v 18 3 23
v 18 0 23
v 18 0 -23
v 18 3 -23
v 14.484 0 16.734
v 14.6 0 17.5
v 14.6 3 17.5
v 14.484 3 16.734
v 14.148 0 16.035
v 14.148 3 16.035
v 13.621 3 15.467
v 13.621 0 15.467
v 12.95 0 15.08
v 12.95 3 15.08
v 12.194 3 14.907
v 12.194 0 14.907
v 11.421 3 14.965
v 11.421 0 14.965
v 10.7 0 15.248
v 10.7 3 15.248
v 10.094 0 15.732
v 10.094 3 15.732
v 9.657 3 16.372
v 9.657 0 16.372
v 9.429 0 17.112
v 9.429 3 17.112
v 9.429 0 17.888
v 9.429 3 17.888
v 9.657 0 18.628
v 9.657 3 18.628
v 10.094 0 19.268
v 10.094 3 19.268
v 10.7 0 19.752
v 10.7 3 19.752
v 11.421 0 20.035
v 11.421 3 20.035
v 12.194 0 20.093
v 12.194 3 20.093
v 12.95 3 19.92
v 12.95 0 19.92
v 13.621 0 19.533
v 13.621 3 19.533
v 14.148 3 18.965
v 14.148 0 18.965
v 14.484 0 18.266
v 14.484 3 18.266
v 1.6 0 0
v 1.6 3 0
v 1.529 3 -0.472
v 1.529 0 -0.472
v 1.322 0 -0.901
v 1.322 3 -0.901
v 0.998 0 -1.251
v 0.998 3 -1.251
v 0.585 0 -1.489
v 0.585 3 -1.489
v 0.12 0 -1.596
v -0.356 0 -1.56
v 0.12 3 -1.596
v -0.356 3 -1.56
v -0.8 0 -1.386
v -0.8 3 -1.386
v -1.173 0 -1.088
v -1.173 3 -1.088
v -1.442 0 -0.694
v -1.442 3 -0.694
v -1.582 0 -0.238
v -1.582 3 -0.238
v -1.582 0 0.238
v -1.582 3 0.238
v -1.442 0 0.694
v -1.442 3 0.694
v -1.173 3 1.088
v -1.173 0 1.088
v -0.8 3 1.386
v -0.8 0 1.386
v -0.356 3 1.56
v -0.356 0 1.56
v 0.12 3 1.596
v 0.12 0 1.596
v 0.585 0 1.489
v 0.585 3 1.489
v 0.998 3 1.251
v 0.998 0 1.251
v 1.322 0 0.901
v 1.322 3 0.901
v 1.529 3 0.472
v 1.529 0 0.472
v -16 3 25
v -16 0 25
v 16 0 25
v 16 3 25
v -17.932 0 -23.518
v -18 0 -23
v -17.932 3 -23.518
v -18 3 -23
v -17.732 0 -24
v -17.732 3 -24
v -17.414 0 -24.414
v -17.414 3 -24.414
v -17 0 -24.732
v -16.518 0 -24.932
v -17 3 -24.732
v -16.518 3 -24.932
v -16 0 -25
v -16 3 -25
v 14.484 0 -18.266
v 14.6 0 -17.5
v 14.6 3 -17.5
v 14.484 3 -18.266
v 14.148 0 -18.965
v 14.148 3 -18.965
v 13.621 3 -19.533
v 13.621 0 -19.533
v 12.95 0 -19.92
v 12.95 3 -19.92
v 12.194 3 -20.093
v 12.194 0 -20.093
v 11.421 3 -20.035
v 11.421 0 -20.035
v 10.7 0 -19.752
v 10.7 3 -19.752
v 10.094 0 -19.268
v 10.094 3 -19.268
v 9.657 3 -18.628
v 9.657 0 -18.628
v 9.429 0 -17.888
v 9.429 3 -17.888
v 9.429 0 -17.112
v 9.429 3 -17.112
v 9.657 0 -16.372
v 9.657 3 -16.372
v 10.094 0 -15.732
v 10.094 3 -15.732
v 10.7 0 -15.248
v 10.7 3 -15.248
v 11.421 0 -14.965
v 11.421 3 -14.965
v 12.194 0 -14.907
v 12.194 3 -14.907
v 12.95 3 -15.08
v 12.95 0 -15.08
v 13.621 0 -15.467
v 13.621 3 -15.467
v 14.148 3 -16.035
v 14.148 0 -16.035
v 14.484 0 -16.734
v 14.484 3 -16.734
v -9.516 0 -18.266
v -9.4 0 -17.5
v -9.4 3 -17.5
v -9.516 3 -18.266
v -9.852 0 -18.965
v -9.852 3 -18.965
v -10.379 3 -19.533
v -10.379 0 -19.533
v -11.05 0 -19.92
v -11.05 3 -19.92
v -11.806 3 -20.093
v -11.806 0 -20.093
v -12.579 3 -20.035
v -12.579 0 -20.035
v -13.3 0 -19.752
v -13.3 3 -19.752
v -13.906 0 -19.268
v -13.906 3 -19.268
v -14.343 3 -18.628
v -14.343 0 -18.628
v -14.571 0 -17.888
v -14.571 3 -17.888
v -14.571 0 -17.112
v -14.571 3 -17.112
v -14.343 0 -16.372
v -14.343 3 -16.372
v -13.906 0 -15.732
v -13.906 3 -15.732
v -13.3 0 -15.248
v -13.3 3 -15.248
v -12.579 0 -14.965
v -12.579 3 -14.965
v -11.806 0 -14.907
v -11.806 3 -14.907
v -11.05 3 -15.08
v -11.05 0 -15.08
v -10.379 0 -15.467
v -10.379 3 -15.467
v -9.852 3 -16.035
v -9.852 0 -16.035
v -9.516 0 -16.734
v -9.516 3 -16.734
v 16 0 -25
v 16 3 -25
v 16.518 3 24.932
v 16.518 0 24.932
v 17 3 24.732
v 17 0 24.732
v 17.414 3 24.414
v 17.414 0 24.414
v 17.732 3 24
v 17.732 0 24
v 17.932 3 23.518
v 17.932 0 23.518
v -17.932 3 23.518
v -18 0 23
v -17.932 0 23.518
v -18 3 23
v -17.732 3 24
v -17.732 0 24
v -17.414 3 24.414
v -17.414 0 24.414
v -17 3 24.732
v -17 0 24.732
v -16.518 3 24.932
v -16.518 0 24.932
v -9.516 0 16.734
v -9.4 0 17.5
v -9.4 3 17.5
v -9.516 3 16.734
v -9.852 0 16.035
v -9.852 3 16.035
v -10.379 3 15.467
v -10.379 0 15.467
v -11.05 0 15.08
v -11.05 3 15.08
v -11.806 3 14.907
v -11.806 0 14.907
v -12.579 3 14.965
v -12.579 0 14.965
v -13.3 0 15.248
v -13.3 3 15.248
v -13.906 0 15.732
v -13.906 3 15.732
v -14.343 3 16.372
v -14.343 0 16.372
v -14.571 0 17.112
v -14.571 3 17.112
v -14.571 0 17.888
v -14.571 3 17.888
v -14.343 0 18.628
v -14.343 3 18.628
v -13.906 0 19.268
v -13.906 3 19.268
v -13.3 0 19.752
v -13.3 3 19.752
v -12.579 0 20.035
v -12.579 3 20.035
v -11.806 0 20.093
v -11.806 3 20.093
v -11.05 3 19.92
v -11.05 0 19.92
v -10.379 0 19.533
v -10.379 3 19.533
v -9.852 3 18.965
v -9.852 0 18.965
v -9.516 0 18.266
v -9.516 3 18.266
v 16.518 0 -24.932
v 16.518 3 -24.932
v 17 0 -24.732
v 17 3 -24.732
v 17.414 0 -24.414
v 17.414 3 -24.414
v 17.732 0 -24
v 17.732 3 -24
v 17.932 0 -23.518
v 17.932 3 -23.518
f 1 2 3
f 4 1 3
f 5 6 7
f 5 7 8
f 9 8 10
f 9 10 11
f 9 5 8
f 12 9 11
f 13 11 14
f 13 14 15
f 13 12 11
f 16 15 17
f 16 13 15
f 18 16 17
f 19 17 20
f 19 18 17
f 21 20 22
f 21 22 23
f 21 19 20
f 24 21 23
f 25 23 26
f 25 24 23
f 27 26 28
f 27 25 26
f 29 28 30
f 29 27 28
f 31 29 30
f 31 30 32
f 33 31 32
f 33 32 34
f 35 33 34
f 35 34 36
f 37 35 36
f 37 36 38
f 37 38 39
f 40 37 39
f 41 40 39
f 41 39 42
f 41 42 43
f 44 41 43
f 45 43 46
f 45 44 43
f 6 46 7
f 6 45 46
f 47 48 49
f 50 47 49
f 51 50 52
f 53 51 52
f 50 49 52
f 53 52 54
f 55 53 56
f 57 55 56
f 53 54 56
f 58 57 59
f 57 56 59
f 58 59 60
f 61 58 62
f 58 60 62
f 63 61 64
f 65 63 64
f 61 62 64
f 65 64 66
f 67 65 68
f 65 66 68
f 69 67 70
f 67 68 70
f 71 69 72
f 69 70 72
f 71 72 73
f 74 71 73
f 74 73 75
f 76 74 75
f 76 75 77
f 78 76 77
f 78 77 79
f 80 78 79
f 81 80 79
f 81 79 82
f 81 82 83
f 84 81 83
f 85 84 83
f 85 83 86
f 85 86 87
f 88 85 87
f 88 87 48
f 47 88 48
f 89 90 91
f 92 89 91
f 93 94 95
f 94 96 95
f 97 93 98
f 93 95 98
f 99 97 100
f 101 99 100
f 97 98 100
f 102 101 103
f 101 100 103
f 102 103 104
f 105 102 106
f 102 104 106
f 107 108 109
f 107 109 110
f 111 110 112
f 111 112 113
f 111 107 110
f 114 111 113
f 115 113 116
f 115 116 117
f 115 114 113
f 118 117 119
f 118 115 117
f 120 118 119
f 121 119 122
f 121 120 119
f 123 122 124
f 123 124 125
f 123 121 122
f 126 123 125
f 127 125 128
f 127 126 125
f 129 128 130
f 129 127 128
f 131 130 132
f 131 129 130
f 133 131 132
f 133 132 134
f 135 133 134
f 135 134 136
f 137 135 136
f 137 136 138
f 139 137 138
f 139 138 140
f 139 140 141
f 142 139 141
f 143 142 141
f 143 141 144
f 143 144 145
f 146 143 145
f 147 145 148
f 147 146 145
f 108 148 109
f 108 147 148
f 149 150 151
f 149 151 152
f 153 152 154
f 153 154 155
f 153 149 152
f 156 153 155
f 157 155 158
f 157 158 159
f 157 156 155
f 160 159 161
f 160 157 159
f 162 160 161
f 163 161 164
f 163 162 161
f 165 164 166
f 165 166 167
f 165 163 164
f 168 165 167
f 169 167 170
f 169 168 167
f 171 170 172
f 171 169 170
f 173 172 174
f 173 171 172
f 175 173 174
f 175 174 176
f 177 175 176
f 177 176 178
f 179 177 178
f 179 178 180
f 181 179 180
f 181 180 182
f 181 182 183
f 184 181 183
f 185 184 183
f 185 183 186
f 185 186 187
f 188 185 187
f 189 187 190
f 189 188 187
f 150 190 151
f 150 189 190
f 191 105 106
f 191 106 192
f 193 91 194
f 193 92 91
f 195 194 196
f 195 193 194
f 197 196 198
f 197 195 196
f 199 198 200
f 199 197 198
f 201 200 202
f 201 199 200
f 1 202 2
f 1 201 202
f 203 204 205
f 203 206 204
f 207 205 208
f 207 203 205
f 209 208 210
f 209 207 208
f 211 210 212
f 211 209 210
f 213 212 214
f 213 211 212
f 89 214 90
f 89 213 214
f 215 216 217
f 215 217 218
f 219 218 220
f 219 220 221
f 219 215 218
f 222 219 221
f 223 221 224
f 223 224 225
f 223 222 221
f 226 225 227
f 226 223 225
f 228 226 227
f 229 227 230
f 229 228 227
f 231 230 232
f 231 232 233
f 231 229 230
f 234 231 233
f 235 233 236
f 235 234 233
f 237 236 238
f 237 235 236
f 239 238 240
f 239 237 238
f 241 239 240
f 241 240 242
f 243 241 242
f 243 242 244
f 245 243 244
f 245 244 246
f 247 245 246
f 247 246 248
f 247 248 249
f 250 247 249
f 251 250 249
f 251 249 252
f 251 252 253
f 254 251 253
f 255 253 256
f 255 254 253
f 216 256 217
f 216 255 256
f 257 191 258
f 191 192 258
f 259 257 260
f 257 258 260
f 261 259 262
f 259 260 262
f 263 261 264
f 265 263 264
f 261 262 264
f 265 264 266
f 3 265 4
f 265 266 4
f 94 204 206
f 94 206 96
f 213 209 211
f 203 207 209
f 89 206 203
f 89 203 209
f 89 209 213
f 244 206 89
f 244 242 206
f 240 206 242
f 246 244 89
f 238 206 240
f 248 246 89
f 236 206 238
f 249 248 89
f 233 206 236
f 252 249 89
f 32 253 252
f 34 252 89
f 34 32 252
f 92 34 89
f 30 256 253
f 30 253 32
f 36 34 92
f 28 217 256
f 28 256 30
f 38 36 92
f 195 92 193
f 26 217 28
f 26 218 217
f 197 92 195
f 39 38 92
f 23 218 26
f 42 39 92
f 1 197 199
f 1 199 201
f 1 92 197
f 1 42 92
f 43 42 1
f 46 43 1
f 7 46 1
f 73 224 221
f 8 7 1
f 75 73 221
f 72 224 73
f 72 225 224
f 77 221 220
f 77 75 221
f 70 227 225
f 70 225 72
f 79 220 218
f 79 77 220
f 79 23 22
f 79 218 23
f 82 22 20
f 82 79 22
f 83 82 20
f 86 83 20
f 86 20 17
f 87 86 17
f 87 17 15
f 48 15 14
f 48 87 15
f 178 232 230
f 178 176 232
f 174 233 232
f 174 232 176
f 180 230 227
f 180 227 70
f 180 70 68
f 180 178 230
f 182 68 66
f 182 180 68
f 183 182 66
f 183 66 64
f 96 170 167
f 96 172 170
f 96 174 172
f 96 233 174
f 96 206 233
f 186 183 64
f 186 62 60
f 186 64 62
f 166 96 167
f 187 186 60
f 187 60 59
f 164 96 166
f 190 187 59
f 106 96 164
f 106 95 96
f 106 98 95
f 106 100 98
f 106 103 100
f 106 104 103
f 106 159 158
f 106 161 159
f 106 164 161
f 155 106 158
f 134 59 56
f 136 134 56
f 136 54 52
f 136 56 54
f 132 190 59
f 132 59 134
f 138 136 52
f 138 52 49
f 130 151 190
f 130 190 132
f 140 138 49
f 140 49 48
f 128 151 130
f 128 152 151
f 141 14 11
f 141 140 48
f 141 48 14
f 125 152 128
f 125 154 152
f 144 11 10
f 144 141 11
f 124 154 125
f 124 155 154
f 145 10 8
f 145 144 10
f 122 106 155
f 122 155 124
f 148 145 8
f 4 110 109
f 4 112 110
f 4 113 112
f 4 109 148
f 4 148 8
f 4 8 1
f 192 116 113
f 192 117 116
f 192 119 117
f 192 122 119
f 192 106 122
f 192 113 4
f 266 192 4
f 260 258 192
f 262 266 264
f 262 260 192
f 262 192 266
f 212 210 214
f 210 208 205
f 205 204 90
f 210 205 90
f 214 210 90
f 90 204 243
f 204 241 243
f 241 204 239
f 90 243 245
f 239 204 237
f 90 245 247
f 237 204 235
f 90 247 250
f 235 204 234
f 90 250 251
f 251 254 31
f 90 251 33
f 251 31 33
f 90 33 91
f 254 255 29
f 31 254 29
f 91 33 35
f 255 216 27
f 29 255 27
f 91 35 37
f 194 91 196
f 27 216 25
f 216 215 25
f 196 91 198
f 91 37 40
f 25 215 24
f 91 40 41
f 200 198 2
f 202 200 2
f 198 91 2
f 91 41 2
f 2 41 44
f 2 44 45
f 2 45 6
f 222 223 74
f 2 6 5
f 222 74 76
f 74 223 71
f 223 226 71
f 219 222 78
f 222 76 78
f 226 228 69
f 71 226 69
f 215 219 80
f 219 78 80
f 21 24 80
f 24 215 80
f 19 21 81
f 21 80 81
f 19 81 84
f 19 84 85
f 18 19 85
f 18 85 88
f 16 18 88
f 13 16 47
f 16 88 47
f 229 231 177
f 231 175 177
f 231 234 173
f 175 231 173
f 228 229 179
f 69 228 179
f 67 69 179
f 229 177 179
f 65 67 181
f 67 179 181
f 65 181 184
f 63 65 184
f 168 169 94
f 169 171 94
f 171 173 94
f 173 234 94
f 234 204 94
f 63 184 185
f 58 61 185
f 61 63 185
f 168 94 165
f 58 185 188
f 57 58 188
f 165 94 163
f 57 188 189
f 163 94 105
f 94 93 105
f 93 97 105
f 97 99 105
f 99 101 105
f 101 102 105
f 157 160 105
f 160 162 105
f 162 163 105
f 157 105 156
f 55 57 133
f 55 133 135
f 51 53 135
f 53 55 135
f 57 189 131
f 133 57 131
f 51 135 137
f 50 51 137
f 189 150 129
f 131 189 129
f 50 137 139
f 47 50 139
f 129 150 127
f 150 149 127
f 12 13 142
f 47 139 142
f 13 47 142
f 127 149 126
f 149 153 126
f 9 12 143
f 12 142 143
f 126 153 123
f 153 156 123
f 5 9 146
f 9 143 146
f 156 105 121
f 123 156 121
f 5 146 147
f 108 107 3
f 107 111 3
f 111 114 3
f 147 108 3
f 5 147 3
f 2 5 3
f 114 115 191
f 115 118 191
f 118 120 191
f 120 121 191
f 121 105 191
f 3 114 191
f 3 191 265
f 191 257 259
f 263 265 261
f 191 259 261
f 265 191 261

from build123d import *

# Parameters (mm, degrees)
SKETCH_1_W          = 36
SKETCH_1_H          = 50
SKETCH_1_R          = 2.6
EXTRUDE_1_DEPTH     = 3
FILLET_1_R          = 2
SKETCH_6_R          = 1.6
CUT_EXTRUDE_5_DEPTH = 10


with BuildPart() as part:
    # 草图1 → 凸台-拉伸1 (new body)
    with BuildSketch(Plane(origin=(0, 0, 0), x_dir=(1, 0, 0), z_dir=(0, 1, 0))):
        Rectangle(SKETCH_1_W, SKETCH_1_H)
        with Locations((-12, 17.5)):
            Circle(SKETCH_1_R, mode=Mode.SUBTRACT)
        with Locations((12, 17.5)):
            Circle(SKETCH_1_R, mode=Mode.SUBTRACT)
        with Locations((-12, -17.5)):
            Circle(SKETCH_1_R, mode=Mode.SUBTRACT)
        with Locations((12, -17.5)):
            Circle(SKETCH_1_R, mode=Mode.SUBTRACT)
    extrude(amount=EXTRUDE_1_DEPTH)

    # 圆角1
    fillet_1_edges = [part.edges().sort_by_distance(p)[0] for p in [
        (18, 1.5, 25),
        (-18, 1.5, 25),
        (-18, 1.5, -25),
        (18, 1.5, -25),
    ]]
    fillet(fillet_1_edges, radius=FILLET_1_R)

    # 草图6 → 切除-拉伸5 (cut)
    with BuildSketch(Plane(origin=(0, 3, 0), x_dir=(1, 0, 0), z_dir=(0, 1, 0))):
        Circle(SKETCH_6_R)
    extrude(amount=-CUT_EXTRUDE_5_DEPTH, mode=Mode.SUBTRACT)


solid = part.part
